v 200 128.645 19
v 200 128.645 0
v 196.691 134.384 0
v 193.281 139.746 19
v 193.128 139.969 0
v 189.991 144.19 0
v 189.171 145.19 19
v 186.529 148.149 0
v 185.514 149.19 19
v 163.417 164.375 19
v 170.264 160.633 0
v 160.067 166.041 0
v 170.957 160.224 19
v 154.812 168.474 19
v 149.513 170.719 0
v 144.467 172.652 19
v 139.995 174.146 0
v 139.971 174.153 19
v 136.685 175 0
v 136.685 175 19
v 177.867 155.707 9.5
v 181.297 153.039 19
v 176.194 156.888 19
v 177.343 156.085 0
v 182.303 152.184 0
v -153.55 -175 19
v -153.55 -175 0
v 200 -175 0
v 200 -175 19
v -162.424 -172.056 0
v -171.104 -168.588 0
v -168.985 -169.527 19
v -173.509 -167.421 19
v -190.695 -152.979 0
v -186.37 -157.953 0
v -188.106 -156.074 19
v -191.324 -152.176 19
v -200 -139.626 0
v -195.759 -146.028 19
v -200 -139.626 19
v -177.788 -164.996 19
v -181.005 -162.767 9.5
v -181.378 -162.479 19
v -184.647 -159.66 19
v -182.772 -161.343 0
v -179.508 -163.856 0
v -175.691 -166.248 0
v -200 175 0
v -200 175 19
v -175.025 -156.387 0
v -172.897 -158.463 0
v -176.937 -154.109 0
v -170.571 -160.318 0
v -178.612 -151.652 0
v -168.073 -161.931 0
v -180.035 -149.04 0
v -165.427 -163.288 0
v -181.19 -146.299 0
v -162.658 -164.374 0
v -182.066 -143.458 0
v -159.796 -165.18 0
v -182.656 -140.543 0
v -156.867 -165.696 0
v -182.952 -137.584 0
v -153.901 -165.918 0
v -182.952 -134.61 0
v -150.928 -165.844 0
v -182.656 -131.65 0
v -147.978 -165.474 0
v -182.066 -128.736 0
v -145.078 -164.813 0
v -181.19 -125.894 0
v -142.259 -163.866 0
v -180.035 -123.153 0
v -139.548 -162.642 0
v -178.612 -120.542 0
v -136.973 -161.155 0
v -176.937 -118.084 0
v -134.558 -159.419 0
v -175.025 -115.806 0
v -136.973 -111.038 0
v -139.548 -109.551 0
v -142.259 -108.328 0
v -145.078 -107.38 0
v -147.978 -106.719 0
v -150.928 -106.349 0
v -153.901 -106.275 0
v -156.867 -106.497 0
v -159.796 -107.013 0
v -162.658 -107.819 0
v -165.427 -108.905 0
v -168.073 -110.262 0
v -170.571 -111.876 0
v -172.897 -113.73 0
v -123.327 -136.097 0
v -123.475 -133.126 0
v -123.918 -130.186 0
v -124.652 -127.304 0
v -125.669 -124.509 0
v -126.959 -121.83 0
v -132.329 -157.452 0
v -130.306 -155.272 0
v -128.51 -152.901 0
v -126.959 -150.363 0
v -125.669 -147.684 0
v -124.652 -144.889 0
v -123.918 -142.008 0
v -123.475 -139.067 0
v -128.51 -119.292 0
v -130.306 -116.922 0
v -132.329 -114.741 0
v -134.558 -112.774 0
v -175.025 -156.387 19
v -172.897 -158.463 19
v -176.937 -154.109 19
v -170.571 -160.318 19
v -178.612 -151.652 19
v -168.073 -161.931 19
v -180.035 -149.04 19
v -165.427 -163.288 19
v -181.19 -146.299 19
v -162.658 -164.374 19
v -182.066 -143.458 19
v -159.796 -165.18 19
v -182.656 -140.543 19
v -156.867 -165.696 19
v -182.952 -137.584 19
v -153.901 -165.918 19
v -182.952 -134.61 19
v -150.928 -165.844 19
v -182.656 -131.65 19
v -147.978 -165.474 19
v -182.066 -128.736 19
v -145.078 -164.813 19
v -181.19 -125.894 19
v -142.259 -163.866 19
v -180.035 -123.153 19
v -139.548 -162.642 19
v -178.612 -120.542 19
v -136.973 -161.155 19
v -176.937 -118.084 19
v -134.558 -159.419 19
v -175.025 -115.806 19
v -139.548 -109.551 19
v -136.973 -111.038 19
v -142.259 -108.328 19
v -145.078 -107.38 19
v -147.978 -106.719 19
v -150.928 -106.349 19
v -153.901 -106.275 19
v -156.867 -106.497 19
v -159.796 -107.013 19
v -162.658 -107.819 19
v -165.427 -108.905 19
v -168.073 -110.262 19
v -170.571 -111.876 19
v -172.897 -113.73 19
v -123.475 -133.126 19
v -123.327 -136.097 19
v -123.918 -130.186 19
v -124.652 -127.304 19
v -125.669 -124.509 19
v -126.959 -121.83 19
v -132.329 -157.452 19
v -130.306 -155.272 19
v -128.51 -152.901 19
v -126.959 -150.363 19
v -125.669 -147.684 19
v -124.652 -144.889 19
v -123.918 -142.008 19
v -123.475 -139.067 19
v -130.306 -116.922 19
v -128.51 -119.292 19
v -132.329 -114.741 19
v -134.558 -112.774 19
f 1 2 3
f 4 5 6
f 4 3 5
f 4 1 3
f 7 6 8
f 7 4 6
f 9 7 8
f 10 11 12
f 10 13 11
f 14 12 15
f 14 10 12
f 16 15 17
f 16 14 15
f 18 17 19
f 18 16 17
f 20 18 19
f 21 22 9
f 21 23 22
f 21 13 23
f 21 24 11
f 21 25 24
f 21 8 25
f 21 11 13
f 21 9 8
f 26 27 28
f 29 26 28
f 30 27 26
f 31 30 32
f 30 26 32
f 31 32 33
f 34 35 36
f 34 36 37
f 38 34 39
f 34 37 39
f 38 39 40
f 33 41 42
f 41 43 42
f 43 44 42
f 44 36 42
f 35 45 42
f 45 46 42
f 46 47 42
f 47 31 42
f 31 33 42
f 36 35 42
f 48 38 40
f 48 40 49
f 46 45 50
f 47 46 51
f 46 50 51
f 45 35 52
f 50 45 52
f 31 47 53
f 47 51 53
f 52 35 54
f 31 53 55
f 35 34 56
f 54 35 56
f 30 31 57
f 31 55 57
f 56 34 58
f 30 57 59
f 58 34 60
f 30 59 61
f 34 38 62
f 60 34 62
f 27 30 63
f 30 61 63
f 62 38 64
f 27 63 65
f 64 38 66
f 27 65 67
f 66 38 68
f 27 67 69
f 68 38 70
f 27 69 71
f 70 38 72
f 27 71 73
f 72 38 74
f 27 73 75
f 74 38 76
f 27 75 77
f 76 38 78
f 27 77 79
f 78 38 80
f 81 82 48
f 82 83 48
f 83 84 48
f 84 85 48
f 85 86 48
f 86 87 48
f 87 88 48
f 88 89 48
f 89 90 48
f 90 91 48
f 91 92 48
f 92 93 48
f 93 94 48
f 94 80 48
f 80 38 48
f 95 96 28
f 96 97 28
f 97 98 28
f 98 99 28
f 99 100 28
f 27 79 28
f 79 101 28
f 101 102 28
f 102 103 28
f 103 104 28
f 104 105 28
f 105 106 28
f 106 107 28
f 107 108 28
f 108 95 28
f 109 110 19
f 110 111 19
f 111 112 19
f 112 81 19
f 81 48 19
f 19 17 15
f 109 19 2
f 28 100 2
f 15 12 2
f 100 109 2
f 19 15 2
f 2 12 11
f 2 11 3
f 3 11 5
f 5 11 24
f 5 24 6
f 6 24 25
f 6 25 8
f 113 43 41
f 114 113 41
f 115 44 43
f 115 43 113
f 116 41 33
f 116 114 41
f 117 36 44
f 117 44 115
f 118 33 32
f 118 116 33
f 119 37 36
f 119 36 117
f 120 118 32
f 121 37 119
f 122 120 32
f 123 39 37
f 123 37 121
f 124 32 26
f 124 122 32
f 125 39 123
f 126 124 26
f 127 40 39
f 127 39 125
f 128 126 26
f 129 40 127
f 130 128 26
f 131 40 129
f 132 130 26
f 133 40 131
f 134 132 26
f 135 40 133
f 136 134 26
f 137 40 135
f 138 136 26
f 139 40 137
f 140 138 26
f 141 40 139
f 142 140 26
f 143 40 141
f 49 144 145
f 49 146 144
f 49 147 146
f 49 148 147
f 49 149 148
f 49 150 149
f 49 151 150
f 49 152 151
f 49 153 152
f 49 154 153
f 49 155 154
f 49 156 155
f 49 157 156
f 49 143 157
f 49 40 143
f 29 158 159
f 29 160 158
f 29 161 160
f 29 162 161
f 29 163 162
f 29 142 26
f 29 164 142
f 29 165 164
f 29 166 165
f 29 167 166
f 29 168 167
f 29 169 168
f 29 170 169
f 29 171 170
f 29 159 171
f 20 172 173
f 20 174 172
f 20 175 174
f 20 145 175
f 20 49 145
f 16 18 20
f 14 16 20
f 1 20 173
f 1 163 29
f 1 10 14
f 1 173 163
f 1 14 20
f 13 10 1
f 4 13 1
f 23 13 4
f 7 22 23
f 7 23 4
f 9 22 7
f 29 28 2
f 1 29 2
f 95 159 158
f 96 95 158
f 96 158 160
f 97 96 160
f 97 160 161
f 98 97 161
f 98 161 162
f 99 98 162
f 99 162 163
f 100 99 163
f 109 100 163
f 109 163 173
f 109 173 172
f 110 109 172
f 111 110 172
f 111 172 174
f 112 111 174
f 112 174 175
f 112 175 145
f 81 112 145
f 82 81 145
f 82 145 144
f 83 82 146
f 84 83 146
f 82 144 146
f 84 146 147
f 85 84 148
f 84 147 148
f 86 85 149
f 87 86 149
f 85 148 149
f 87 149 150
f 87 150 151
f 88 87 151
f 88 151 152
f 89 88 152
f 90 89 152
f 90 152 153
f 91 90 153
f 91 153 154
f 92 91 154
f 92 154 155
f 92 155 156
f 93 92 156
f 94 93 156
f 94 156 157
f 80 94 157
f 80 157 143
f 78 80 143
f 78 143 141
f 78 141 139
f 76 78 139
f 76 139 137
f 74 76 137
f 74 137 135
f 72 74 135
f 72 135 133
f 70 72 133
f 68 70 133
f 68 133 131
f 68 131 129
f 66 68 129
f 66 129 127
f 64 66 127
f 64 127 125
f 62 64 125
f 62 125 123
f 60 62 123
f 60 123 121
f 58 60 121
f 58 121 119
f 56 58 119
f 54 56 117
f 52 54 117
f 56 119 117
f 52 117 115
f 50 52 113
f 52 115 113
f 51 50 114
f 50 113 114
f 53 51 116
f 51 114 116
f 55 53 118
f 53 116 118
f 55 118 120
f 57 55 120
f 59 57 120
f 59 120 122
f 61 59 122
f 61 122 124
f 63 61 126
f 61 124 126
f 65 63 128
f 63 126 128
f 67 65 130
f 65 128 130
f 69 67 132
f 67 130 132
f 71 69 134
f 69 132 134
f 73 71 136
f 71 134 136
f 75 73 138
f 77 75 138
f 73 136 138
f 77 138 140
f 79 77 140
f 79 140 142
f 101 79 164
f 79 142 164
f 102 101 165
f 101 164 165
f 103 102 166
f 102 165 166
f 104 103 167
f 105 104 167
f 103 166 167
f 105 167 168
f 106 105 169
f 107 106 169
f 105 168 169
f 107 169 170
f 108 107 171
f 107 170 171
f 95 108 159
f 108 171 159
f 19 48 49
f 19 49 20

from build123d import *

# Parameters (mm, degrees)
F0_W     = 400
F0_H     = 350
F1_DEPTH = 19
F3_DEPTH = 19.001
F5_DEPTH = 19.0010001
F6_R     = 29.8311092156
F7_DEPTH = 19.0010001


with BuildPart() as f1:
    # F0 (on Top) → F1 (new body)
    with BuildSketch(Plane.XY):
        Rectangle(F0_W, F0_H)
    extrude(amount=F1_DEPTH)

    # F2 (on face) → F3 (cut, through all)
    with BuildSketch(Plane.XY.offset(19)):
        with BuildLine():
            Line((-200, -175), (-153.5498946905, -175))
            add(Edge.make_bspline(
                [(-153.5498946905, -175), (-163.4039395761, -171.8359123662), (-183.0925961159, -165.5139770182), (-194.3679083837, -148.2499611163), (-200, -139.6264731884)],
                knots=[0, 0, 0, 0, 0.5004935134, 1, 1, 1, 1], degree=3))
            Line((-200, -139.6264731884), (-200, -175))
        make_face()
    extrude(amount=-F3_DEPTH, mode=Mode.SUBTRACT)

    # F4 (on face) → F5 (cut, through all)
    with BuildSketch(Plane.XY.offset(19)):
        with BuildLine():
            add(Edge.make_bspline(
                [(200, 128.6446154118), (194.7222925813, 137.9655766375), (183.4252032849, 157.9173706538), (143.2622746246, 173.7434099364), (136.6848945618, 175)],
                knots=[0, 0, 0, 0, 0.4098176195, 0.877226772, 0.877226772, 0.877226772, 0.877226772], degree=3))
            Line((200, 128.6446154118), (200, 175))
            Line((200, 175), (136.6848945618, 175))
        make_face()
    extrude(amount=-F5_DEPTH, mode=Mode.SUBTRACT)

    # F6 (on face) → F7 (cut, through all)
    with BuildSketch(Plane.XY.offset(19)):
        with Locations((-153.1576812267, -136.0965818167)):
            Circle(F6_R)
    extrude(amount=-F7_DEPTH, mode=Mode.SUBTRACT)


solid = f1.part
